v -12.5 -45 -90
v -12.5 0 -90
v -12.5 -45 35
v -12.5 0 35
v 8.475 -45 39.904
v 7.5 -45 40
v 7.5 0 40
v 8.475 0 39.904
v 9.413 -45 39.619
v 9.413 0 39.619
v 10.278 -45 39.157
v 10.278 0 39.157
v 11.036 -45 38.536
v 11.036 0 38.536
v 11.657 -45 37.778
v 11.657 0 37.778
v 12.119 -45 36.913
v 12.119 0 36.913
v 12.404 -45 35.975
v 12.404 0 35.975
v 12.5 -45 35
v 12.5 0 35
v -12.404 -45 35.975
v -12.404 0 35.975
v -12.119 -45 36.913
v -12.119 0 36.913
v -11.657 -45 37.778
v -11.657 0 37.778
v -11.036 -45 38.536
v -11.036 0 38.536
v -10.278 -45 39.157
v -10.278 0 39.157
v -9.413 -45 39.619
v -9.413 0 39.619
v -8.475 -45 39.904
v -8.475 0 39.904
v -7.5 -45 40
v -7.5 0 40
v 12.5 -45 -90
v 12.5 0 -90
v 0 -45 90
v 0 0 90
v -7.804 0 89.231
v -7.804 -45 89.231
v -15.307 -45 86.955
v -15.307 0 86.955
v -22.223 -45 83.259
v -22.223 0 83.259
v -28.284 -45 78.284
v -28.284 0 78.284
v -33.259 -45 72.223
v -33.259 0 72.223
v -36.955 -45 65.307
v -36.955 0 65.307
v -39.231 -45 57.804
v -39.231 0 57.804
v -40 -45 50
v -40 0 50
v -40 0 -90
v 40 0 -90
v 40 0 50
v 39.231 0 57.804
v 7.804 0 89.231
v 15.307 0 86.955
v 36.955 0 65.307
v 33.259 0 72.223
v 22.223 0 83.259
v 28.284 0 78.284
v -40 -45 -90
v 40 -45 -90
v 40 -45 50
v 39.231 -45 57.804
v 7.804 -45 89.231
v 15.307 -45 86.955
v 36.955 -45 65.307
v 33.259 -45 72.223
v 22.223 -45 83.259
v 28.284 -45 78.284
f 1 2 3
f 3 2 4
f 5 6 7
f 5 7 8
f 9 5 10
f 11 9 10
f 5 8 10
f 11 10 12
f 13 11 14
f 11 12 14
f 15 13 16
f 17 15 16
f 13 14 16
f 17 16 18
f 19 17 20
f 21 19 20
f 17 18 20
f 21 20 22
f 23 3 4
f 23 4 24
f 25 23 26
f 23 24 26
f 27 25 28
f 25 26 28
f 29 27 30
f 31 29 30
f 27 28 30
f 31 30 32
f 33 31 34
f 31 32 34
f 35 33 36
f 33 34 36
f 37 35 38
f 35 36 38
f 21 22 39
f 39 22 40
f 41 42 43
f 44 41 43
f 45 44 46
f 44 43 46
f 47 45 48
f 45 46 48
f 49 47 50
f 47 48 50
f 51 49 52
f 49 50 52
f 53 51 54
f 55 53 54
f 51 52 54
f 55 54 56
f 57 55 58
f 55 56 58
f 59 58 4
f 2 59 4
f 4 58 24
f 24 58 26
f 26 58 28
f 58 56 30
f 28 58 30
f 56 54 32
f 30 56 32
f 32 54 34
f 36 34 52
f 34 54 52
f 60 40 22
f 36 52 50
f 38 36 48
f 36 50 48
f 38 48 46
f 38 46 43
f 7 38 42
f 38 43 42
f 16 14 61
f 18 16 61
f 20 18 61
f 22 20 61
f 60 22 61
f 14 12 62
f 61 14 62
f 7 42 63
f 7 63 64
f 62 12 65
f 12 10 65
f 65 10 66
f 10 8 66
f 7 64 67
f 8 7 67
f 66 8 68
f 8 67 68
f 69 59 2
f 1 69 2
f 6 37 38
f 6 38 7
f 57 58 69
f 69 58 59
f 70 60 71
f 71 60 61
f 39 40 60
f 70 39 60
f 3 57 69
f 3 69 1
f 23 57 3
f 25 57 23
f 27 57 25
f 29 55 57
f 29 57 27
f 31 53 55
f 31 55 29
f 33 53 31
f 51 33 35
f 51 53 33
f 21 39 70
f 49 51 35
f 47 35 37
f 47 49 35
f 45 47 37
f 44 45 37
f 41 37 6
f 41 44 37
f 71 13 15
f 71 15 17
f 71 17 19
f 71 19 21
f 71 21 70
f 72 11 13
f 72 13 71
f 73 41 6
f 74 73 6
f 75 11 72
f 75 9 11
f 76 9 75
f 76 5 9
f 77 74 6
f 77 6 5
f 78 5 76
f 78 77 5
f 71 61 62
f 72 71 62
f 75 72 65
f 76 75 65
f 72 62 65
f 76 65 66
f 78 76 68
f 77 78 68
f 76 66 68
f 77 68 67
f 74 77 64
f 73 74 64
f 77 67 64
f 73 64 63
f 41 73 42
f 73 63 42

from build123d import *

# Parameters (mm, degrees)
F1_DEPTH = 45


with BuildPart() as f1:
    # F0 (on Front) → F1 (new body)
    with BuildSketch(Plane.XZ):
        with BuildLine():
            Line((12.5, -90), (40, -90))
            Line((40, -90), (40, 50))
            ThreePointArc((40, 50), (28.284271, 78.284271), (0, 90))
            ThreePointArc((0, 90), (-28.284271, 78.284271), (-40, 50))
            Line((-40, 50), (-40, -90))
            Line((-40, -90), (-12.5, -90))
            Line((-12.5, -90), (-12.5, 35))
            ThreePointArc((-12.5, 35), (-11.035534, 38.535534), (-7.5, 40))
            Line((-7.5, 40), (7.5, 40))
            ThreePointArc((7.5, 40), (11.035534, 38.535534), (12.5, 35))
            Line((12.5, 35), (12.5, -90))
        make_face()
    extrude(amount=F1_DEPTH)


solid = f1.part
